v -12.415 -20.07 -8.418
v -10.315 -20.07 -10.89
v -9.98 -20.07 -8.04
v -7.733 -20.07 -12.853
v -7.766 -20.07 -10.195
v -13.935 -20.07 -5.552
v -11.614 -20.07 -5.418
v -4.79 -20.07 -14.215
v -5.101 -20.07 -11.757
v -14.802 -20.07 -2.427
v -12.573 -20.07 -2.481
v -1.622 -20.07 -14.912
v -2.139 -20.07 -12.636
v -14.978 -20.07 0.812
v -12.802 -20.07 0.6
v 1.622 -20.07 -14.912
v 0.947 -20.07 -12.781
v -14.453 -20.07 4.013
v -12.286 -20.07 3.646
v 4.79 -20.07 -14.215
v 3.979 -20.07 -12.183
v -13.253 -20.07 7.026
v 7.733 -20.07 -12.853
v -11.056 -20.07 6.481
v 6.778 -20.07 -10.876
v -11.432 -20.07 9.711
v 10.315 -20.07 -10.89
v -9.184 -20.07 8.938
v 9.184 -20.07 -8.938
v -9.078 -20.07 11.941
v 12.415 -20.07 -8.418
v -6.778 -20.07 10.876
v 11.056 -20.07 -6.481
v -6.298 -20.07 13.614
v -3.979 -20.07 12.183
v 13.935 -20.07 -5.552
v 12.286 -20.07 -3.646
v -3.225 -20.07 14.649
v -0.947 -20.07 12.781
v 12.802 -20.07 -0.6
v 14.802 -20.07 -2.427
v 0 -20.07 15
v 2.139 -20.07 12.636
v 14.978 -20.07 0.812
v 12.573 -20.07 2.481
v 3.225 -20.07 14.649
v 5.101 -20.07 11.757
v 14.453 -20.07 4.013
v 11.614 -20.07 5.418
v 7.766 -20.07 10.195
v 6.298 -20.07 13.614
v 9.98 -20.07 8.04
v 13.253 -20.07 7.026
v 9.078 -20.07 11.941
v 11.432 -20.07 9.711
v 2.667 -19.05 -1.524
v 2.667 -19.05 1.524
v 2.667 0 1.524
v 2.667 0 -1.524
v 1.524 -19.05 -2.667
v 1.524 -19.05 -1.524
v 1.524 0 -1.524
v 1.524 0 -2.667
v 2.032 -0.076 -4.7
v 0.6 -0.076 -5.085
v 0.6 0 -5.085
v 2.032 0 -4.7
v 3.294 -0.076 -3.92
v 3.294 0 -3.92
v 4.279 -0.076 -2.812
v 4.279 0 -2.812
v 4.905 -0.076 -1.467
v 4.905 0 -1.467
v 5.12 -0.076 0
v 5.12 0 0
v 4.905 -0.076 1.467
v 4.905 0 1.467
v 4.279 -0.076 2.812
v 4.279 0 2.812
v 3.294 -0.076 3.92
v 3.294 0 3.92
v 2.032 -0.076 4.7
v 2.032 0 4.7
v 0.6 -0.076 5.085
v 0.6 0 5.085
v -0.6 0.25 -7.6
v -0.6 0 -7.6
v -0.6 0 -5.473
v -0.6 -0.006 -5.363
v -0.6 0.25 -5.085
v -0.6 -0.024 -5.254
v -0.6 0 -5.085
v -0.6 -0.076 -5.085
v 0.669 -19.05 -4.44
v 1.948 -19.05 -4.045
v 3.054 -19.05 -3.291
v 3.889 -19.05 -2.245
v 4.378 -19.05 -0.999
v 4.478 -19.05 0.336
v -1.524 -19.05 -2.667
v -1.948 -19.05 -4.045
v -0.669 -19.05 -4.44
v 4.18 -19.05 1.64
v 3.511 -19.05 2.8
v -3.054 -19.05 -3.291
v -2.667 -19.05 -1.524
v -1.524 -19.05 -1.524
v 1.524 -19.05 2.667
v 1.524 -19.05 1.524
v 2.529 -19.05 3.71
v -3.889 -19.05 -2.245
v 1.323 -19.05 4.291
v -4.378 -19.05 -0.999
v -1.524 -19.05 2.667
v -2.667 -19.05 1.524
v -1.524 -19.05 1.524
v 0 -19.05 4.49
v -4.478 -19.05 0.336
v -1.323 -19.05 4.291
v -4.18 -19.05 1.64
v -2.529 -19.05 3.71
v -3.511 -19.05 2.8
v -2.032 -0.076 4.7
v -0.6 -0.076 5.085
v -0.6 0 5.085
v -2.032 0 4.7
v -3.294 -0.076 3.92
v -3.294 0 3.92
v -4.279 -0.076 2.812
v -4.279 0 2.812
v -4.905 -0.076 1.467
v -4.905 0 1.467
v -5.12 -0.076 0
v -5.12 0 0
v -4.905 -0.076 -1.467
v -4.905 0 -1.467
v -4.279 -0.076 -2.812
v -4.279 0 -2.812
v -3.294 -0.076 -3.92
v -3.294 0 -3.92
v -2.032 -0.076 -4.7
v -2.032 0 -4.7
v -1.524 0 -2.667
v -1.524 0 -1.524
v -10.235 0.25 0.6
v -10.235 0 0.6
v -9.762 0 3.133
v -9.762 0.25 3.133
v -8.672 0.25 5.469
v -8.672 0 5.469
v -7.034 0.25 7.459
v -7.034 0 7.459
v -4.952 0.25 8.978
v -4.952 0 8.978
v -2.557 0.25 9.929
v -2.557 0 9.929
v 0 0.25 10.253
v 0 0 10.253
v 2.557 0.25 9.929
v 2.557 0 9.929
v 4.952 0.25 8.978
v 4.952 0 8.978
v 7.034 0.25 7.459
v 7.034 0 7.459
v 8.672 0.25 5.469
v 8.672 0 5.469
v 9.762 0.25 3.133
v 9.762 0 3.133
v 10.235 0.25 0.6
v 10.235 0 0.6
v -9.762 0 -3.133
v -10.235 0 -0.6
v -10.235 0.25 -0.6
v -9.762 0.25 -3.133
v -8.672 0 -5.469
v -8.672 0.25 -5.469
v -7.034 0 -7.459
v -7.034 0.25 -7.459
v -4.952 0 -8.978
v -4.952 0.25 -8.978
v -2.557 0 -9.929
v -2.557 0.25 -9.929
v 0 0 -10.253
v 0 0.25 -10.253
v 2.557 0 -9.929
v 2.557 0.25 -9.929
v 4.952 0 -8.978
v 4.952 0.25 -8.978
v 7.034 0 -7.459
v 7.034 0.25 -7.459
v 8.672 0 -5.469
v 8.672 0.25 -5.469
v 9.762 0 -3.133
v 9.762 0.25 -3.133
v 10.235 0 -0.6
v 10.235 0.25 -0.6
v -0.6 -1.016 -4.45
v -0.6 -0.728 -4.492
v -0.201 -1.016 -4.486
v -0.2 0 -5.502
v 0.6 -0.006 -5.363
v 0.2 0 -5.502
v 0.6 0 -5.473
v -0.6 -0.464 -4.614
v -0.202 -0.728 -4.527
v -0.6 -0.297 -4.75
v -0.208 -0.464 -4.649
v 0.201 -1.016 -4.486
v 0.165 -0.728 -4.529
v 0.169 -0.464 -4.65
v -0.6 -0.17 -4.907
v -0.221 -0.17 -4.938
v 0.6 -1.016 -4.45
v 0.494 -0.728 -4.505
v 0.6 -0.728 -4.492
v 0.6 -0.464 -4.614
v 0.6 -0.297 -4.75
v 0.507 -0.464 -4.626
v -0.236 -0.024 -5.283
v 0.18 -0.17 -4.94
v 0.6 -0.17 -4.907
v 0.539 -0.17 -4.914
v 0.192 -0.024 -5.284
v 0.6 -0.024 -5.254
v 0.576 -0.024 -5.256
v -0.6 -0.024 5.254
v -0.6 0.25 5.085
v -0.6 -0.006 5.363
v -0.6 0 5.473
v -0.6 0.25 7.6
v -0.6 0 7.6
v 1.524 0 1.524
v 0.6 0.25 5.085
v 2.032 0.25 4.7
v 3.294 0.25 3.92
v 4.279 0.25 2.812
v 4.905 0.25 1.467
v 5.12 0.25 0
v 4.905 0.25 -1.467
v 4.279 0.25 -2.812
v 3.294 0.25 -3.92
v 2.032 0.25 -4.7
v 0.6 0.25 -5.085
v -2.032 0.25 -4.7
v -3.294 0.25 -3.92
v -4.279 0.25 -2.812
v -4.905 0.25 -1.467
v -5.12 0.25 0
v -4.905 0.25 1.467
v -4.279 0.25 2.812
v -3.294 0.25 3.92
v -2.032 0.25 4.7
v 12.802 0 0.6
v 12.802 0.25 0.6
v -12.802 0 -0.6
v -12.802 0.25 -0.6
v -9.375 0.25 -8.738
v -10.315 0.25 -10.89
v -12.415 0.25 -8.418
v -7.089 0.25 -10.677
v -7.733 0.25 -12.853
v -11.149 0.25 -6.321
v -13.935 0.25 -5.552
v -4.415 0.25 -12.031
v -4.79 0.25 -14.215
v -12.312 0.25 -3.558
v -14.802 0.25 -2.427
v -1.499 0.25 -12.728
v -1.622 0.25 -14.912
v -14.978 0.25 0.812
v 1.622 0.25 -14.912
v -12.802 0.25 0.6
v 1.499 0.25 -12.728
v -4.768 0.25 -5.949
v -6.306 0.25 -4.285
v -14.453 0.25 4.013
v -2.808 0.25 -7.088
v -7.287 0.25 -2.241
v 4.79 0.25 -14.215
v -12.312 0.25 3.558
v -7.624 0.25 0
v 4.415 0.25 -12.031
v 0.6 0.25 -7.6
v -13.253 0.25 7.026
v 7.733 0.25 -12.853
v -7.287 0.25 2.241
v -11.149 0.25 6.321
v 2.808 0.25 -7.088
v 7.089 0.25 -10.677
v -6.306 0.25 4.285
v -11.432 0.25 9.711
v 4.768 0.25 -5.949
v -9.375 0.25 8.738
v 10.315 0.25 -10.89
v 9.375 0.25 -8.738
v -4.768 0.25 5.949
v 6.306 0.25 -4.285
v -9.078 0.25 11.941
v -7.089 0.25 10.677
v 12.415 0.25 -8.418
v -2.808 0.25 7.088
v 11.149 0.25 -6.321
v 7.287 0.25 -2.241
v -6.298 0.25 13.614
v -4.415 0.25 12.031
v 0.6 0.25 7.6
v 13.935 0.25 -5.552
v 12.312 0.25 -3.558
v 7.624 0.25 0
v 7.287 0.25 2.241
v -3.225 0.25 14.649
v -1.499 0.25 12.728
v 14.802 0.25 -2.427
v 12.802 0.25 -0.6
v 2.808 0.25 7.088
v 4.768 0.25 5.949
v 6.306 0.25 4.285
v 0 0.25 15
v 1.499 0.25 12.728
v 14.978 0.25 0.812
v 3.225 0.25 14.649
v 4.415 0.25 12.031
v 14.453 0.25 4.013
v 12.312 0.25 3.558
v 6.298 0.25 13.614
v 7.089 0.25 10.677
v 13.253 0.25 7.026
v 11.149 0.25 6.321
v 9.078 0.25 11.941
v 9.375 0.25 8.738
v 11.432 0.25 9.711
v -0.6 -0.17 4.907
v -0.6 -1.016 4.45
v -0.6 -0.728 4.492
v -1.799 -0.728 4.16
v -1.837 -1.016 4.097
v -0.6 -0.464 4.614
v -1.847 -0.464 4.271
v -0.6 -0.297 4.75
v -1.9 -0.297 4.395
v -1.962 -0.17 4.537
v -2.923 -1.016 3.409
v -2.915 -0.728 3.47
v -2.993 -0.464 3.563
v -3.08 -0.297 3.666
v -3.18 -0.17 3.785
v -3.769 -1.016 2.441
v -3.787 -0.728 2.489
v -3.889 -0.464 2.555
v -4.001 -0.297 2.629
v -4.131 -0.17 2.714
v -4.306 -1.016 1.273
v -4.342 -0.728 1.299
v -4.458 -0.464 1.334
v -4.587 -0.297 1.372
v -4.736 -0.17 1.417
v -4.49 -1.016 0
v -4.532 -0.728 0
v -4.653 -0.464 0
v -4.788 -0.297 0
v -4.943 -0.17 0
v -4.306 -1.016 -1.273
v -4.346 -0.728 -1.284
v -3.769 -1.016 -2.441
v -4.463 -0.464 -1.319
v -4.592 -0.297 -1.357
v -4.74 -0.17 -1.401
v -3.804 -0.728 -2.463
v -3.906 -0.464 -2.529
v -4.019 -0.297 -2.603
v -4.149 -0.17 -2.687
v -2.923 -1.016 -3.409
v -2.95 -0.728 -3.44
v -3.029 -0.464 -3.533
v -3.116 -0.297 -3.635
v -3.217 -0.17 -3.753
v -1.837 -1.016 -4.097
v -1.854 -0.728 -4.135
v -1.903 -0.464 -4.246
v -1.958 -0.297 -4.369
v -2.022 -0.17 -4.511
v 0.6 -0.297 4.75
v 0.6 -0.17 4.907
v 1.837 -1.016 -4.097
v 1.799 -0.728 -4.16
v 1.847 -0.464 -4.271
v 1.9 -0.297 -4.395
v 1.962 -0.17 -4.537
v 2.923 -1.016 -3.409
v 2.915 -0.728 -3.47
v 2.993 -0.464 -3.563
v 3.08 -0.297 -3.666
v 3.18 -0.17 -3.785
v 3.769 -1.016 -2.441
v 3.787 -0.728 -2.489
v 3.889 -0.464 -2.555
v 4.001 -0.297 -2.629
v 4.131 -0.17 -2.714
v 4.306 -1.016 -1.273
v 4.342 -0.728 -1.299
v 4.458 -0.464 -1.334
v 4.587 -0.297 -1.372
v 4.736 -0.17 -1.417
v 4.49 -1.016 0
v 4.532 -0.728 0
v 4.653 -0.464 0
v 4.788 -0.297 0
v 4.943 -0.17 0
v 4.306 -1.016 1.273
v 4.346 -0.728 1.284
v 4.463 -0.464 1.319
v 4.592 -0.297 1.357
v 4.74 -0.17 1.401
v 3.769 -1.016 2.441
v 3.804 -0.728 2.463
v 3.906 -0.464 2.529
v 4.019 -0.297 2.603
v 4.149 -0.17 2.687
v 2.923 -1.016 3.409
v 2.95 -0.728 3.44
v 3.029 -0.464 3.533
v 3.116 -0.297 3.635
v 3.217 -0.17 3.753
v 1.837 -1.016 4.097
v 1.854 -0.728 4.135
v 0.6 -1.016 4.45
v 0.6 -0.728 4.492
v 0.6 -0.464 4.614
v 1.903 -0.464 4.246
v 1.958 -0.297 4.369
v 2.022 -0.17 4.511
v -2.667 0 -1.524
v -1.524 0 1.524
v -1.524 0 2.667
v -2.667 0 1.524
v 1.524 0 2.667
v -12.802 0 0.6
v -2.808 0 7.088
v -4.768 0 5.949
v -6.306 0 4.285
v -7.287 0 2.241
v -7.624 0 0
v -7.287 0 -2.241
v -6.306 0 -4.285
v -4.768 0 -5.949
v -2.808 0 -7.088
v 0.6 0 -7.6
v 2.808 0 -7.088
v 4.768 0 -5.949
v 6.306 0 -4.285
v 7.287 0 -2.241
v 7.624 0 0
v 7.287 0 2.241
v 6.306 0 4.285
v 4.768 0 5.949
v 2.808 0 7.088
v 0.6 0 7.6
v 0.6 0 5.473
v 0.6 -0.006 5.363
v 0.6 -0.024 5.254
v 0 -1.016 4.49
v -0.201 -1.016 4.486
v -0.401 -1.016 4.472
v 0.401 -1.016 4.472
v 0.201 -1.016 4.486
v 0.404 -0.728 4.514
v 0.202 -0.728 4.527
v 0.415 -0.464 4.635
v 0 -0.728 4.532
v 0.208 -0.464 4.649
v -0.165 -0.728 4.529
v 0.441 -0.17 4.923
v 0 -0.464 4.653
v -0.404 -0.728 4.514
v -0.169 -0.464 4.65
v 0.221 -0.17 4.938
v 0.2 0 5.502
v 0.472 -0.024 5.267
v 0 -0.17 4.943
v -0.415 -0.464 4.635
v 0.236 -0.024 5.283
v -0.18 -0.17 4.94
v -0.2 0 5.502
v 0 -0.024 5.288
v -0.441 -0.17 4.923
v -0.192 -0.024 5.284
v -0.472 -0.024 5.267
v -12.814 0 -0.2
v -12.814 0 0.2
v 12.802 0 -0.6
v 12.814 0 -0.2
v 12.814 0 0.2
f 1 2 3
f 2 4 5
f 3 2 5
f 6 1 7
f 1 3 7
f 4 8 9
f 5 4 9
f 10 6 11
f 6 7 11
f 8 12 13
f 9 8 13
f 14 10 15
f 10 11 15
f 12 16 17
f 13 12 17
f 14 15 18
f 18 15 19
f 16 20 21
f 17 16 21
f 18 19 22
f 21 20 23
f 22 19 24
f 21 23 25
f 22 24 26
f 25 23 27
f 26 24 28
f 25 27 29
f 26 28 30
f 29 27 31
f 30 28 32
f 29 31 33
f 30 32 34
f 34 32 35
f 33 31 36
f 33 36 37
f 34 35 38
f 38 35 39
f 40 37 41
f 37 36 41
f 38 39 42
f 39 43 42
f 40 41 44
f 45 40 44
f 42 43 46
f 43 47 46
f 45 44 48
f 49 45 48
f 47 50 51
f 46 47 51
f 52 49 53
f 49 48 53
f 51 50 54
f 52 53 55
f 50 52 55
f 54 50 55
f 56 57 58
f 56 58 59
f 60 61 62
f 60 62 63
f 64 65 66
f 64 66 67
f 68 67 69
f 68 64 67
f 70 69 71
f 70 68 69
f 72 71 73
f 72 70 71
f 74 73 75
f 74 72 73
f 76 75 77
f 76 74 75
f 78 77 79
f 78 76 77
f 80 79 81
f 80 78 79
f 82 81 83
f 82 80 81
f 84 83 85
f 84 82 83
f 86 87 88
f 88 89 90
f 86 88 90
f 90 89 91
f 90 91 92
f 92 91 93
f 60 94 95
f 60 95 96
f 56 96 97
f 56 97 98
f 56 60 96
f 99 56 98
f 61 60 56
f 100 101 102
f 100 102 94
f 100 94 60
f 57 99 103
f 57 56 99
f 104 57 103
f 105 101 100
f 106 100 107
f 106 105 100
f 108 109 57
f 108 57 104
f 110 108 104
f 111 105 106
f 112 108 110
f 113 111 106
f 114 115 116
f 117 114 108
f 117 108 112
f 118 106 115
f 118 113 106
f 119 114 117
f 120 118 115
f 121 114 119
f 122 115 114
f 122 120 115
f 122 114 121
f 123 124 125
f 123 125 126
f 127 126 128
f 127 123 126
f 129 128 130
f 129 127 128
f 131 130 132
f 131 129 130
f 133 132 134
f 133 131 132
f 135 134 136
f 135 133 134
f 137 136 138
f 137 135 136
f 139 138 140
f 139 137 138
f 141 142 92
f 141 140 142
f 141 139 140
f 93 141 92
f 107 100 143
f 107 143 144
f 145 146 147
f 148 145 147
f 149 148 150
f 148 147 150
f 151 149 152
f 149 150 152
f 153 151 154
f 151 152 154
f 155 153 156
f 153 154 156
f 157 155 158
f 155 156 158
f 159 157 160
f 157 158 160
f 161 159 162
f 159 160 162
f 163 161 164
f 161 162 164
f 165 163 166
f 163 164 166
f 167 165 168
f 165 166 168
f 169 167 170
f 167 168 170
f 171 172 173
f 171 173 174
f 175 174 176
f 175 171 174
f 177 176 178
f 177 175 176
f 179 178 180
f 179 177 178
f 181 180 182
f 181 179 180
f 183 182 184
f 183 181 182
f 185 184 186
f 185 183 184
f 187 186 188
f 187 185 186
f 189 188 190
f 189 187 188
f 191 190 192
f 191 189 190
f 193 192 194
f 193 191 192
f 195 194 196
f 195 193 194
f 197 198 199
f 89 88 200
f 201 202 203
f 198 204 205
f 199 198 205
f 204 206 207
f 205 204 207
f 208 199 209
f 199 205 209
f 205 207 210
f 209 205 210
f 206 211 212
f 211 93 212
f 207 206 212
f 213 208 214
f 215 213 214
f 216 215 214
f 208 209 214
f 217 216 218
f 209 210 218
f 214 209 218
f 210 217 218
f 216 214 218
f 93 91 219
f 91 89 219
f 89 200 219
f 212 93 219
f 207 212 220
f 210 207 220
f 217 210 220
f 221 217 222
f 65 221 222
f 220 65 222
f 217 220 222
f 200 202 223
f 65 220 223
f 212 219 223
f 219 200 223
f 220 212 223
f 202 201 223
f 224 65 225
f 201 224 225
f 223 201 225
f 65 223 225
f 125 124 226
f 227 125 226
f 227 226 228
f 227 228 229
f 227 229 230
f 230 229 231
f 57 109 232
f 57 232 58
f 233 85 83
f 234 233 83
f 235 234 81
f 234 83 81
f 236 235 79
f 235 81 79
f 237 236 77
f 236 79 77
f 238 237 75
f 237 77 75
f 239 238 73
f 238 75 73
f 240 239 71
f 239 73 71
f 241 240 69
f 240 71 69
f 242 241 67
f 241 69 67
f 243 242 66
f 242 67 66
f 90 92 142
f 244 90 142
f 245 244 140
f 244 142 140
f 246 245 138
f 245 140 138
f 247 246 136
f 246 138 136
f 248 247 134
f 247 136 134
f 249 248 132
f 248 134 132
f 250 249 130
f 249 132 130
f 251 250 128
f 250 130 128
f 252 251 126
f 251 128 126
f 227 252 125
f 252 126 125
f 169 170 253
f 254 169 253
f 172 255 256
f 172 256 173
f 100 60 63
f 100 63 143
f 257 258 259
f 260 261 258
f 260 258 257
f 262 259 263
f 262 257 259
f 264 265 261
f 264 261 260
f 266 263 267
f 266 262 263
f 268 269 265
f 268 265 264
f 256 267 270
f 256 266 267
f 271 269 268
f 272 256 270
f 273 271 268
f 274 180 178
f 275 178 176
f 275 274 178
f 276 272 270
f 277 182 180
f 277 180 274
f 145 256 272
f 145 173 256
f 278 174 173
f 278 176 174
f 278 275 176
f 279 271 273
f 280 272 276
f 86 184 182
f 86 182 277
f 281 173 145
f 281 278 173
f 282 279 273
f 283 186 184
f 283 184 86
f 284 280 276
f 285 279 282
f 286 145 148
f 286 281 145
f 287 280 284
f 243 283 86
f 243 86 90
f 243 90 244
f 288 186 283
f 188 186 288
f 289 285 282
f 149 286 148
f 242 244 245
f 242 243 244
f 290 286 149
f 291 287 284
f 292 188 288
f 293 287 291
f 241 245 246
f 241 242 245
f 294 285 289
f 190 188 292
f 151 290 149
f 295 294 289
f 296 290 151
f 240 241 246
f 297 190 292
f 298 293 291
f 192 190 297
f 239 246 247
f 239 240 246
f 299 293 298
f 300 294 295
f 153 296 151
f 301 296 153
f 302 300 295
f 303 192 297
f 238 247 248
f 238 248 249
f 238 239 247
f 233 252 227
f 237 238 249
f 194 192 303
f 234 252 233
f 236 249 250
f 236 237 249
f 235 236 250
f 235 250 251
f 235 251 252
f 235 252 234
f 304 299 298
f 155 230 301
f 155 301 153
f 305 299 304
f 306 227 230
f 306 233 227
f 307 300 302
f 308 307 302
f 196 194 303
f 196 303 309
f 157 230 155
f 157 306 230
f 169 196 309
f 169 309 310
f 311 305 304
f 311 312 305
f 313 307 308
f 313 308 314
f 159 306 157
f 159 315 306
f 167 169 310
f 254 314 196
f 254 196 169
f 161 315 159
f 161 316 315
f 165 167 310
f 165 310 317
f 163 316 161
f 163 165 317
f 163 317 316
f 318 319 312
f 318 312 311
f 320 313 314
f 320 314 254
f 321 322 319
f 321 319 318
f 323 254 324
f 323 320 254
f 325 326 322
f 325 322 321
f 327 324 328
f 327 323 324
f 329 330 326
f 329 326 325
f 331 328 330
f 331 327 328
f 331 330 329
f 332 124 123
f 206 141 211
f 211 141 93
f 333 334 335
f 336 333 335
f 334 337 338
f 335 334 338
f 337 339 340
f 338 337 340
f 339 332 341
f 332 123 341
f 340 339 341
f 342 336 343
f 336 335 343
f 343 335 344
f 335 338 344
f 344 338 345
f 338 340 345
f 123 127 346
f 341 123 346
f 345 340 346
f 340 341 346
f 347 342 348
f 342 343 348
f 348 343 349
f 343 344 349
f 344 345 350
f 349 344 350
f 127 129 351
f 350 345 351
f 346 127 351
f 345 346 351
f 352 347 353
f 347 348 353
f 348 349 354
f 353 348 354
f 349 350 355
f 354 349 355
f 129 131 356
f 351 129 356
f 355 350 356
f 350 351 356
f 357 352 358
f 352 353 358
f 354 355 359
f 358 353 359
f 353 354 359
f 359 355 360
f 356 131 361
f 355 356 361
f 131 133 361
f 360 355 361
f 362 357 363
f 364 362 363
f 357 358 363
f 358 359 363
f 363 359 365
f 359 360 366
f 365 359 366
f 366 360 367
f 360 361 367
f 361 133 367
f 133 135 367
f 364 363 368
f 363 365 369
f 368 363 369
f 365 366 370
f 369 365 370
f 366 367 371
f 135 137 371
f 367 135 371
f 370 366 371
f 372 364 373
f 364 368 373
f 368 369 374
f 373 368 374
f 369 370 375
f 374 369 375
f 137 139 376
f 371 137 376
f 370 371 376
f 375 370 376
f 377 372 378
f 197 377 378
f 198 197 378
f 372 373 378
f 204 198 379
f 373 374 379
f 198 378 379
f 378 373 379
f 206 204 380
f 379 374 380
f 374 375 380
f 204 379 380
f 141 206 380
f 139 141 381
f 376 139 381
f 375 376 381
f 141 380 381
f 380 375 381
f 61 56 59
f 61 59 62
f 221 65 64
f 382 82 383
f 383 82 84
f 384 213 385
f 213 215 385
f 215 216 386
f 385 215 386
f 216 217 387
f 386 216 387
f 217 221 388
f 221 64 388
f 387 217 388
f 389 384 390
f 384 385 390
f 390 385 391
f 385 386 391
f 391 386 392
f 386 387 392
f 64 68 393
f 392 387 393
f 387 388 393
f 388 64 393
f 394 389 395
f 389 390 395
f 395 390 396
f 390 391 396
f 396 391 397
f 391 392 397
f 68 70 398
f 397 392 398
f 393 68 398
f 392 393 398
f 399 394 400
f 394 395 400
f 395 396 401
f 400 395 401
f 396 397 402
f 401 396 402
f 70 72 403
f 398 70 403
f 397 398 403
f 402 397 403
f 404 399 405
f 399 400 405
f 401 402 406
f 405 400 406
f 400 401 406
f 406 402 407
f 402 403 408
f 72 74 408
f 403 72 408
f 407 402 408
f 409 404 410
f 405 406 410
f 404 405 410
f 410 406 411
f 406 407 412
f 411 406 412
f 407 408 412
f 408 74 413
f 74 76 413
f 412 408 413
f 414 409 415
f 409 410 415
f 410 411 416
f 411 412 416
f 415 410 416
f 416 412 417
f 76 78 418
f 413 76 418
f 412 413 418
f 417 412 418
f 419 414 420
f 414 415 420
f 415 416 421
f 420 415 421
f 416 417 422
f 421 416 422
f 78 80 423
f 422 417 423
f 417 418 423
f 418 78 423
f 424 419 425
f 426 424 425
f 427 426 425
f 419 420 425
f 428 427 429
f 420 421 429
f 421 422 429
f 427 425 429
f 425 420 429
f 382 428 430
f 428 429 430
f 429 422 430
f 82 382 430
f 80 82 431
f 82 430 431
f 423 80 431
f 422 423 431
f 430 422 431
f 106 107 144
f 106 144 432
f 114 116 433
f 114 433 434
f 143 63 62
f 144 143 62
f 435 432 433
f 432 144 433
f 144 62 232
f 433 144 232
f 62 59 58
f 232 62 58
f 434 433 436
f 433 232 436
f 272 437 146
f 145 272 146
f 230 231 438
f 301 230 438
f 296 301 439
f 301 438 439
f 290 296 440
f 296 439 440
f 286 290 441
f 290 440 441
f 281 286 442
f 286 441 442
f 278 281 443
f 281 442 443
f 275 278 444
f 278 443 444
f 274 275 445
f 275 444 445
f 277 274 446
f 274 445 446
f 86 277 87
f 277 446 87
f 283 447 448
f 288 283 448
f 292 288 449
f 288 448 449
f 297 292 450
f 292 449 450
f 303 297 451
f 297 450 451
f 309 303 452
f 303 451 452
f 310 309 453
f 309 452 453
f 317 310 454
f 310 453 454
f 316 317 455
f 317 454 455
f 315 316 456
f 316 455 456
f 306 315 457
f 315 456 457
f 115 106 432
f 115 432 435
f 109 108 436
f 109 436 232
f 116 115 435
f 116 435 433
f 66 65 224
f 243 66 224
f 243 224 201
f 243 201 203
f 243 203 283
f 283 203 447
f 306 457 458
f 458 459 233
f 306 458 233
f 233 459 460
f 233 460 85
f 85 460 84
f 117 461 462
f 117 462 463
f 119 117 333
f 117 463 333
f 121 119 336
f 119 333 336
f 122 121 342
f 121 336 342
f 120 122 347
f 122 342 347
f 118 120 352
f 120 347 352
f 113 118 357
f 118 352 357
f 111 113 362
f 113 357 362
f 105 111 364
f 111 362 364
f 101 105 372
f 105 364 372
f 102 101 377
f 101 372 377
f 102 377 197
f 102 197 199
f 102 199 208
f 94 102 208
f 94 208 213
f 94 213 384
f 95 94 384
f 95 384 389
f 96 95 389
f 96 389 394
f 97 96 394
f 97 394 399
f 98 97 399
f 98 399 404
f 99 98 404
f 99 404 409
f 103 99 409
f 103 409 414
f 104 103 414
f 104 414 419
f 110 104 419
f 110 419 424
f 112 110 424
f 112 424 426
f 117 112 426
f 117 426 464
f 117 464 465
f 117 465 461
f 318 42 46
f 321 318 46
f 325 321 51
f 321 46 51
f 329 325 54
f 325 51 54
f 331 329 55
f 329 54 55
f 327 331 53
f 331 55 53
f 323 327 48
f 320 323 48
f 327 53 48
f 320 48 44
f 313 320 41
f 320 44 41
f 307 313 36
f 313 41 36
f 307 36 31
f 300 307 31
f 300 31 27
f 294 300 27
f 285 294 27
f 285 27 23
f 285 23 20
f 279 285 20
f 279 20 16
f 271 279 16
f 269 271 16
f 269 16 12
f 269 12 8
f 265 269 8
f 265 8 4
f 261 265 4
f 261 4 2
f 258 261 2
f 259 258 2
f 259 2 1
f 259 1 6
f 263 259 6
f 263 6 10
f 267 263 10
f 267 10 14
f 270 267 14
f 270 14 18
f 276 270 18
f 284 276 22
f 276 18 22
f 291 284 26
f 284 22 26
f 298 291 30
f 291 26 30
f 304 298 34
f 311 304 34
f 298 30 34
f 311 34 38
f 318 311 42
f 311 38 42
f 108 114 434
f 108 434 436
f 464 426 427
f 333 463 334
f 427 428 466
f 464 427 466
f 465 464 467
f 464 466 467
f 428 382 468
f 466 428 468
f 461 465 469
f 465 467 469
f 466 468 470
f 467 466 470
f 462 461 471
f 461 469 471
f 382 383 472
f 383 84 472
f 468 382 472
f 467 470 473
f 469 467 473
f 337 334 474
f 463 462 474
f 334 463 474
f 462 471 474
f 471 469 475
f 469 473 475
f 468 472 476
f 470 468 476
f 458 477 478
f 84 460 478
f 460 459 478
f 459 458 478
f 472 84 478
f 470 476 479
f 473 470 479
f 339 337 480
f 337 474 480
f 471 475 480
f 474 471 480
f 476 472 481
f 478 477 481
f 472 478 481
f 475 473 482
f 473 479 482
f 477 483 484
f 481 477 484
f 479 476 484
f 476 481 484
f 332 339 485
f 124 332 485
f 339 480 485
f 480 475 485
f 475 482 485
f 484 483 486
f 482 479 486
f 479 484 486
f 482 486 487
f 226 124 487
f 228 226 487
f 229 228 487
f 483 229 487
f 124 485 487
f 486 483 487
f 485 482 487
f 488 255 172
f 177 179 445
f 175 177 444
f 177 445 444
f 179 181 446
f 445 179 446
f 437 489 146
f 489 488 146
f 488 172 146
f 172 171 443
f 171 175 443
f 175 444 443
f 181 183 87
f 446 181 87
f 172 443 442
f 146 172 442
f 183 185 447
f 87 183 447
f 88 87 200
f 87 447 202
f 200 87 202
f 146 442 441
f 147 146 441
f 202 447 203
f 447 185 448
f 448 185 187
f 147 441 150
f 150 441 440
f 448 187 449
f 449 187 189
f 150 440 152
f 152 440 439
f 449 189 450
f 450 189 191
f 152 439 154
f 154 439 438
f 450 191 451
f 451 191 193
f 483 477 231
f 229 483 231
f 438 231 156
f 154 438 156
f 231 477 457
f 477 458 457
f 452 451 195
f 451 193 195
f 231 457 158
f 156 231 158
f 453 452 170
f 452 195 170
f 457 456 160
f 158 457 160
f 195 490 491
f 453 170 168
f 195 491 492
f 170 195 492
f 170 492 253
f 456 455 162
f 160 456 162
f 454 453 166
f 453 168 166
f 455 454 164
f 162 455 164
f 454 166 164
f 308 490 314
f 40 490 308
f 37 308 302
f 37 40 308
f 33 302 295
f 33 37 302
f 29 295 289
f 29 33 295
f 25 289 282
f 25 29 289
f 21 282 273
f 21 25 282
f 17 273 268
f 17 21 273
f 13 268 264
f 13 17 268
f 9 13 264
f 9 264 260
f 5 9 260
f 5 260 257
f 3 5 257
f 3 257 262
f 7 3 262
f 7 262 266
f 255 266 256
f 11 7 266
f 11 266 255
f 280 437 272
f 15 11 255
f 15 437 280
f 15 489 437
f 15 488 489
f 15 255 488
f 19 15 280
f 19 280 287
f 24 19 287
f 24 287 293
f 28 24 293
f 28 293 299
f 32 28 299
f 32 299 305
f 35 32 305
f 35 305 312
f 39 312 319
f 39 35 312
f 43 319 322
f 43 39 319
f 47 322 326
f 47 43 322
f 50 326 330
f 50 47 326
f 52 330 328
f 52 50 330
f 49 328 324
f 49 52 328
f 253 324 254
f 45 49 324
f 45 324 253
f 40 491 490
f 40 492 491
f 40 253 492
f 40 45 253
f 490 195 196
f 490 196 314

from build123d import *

# Parameters (mm, degrees)
SKETCH1_R           = 15
BOSS_EXTRUDE1_DEPTH = 0.25
BOSS_EXTRUDE2_START = -20.32
SKETCH2_R           = 15
SKETCH2_R_2         = 12.815737343
BOSS_EXTRUDE2_DEPTH = 20.32
SKETCH3_R           = 4.490128061
BOSS_EXTRUDE3_DEPTH = 19.05
FILLET2_R           = 1.016


with BuildPart() as part:
    # Sketch1 → Boss-Extrude1 (new body)
    with BuildSketch(Plane(origin=(0, 0, 0), x_dir=(1, 0, 0), z_dir=(0, 1, 0))):
        with Locations(Location((0, 0, 0), (0, 0, 270))):
            Circle(SKETCH1_R)
        with BuildLine():
            Line((-12.801684406, 0.6), (-10.235182592, 0.6))
            ThreePointArc((-10.235182592, 0.6), (0, 10.252753907), (10.235182592, 0.6))
            Line((10.235182592, 0.6), (12.801684406, 0.6))
            ThreePointArc((12.801684406, 0.6), (0, 12.815737343), (-12.801684406, 0.6))
        make_face(mode=Mode.SUBTRACT)
        with BuildLine():
            Line((-0.6, 7.600213812), (-0.6, 5.084960781))
            ThreePointArc((-0.6, 5.084960781), (-5.120236922, 0), (-0.6, -5.084960781))
            Line((-0.6, -5.084960781), (-0.6, -7.600213812))
            ThreePointArc((-0.6, -7.600213812), (-7.623860569, 0), (-0.6, 7.600213812))
        make_face(mode=Mode.SUBTRACT)
        with BuildLine():
            Line((0.6, 5.084960781), (0.6, 7.600213812))
            ThreePointArc((0.6, 7.600213812), (7.623860569, 0), (0.6, -7.600213812))
            Line((0.6, -7.600213812), (0.6, -5.084960781))
            ThreePointArc((0.6, -5.084960781), (5.120236922, 0), (0.6, 5.084960781))
        make_face(mode=Mode.SUBTRACT)
        with BuildLine():
            Line((-12.801684406, -0.6), (-10.235182592, -0.6))
            ThreePointArc((-10.235182592, -0.6), (0, -10.252753907), (10.235182592, -0.6))
            Line((10.235182592, -0.6), (12.801684406, -0.6))
            ThreePointArc((12.801684406, -0.6), (0, -12.815737343), (-12.801684406, -0.6))
        make_face(mode=Mode.SUBTRACT)
    extrude(amount=BOSS_EXTRUDE1_DEPTH)

    # Sketch2 → Boss-Extrude2 (add)
    with BuildSketch(Plane(origin=(0, 0.25, 0), x_dir=(1, 0, 0), z_dir=(0, 1, 0)).offset(BOSS_EXTRUDE2_START)):
        with Locations(Location((0, 0, 0), (0, 0, 270))):
            Circle(SKETCH2_R)
        with Locations(Location((0, 0, 0), (0, 0, 2.683422553))):
            Circle(SKETCH2_R_2, mode=Mode.SUBTRACT)
    extrude(amount=BOSS_EXTRUDE2_DEPTH)

    # Sketch3 → Boss-Extrude3 (add)
    with BuildSketch(Plane.XZ):
        with Locations(Location((0, 0, 0), (0, 0, 90))):
            Circle(SKETCH3_R)
        Polygon((-1.524, 1.524), (-1.524, 2.667), (1.524, 2.667), (1.524, 1.524), (2.667, 1.524), (2.667, -1.524), (1.524, -1.524), (1.524, -2.667), (-1.524, -2.667), (-1.524, -1.524), (-2.667, -1.524), (-2.667, 1.524), align=None, mode=Mode.SUBTRACT)
    extrude(amount=BOSS_EXTRUDE3_DEPTH)

    # Fillet2
    # the kernel refuses this fillet: 1.016 mm, written as the material it adds along each edge
    with BuildSketch(Plane(origin=(0, 0, 0), x_dir=(0, 0, 1), z_dir=(1, 0, 0))) as fillet2_piece_1_section:
        with BuildLine():
            CenterArc((4.490128061 + FILLET2_R, FILLET2_R), FILLET2_R, 180, 90)
            Line((4.490128061, FILLET2_R), (4.490128061, 0))
            Line((4.490128061, 0), (4.490128061 + FILLET2_R, 0))
        make_face()
    fillet2_piece_1 = revolve(axis=Axis((0, 0, 0), (0, -1, 0)), mode=Mode.PRIVATE)
    fillet2_piece_1 = split(fillet2_piece_1, bisect_by=Plane(origin=(0.6, -0.022686873, 5.204418355), z_dir=(-1, 0, 0)), keep=Keep.TOP, mode=Mode.PRIVATE)
    fillet2_piece_1 = split(fillet2_piece_1, bisect_by=Plane(origin=(-0.6, -0.022686873, 5.204418355), z_dir=(1, 0, 0)), keep=Keep.TOP, mode=Mode.PRIVATE)
    add(fillet2_piece_1)
    with BuildSketch(Plane(origin=(0, 0, 0), x_dir=(0, 0, 1), z_dir=(1, 0, 0))) as fillet2_piece_2_section:
        with BuildLine():
            CenterArc((4.490128061 + FILLET2_R, FILLET2_R), FILLET2_R, 180, 90)
            Line((4.490128061, FILLET2_R), (4.490128061, 0))
            Line((4.490128061, 0), (4.490128061 + FILLET2_R, 0))
        make_face()
    fillet2_piece_2 = revolve(axis=Axis((0, 0, 0), (0, -1, 0)), mode=Mode.PRIVATE)
    fillet2_piece_2 = fillet2_piece_2 & Plane(origin=(0, -0.038068082, 0), x_dir=(0.11718207753036296, 0, 0.9931104473852181), z_dir=(0, -1, 0)) * Cylinder(5.120236922, 23, mode=Mode.PRIVATE)
    add(fillet2_piece_2)


solid = part.part
